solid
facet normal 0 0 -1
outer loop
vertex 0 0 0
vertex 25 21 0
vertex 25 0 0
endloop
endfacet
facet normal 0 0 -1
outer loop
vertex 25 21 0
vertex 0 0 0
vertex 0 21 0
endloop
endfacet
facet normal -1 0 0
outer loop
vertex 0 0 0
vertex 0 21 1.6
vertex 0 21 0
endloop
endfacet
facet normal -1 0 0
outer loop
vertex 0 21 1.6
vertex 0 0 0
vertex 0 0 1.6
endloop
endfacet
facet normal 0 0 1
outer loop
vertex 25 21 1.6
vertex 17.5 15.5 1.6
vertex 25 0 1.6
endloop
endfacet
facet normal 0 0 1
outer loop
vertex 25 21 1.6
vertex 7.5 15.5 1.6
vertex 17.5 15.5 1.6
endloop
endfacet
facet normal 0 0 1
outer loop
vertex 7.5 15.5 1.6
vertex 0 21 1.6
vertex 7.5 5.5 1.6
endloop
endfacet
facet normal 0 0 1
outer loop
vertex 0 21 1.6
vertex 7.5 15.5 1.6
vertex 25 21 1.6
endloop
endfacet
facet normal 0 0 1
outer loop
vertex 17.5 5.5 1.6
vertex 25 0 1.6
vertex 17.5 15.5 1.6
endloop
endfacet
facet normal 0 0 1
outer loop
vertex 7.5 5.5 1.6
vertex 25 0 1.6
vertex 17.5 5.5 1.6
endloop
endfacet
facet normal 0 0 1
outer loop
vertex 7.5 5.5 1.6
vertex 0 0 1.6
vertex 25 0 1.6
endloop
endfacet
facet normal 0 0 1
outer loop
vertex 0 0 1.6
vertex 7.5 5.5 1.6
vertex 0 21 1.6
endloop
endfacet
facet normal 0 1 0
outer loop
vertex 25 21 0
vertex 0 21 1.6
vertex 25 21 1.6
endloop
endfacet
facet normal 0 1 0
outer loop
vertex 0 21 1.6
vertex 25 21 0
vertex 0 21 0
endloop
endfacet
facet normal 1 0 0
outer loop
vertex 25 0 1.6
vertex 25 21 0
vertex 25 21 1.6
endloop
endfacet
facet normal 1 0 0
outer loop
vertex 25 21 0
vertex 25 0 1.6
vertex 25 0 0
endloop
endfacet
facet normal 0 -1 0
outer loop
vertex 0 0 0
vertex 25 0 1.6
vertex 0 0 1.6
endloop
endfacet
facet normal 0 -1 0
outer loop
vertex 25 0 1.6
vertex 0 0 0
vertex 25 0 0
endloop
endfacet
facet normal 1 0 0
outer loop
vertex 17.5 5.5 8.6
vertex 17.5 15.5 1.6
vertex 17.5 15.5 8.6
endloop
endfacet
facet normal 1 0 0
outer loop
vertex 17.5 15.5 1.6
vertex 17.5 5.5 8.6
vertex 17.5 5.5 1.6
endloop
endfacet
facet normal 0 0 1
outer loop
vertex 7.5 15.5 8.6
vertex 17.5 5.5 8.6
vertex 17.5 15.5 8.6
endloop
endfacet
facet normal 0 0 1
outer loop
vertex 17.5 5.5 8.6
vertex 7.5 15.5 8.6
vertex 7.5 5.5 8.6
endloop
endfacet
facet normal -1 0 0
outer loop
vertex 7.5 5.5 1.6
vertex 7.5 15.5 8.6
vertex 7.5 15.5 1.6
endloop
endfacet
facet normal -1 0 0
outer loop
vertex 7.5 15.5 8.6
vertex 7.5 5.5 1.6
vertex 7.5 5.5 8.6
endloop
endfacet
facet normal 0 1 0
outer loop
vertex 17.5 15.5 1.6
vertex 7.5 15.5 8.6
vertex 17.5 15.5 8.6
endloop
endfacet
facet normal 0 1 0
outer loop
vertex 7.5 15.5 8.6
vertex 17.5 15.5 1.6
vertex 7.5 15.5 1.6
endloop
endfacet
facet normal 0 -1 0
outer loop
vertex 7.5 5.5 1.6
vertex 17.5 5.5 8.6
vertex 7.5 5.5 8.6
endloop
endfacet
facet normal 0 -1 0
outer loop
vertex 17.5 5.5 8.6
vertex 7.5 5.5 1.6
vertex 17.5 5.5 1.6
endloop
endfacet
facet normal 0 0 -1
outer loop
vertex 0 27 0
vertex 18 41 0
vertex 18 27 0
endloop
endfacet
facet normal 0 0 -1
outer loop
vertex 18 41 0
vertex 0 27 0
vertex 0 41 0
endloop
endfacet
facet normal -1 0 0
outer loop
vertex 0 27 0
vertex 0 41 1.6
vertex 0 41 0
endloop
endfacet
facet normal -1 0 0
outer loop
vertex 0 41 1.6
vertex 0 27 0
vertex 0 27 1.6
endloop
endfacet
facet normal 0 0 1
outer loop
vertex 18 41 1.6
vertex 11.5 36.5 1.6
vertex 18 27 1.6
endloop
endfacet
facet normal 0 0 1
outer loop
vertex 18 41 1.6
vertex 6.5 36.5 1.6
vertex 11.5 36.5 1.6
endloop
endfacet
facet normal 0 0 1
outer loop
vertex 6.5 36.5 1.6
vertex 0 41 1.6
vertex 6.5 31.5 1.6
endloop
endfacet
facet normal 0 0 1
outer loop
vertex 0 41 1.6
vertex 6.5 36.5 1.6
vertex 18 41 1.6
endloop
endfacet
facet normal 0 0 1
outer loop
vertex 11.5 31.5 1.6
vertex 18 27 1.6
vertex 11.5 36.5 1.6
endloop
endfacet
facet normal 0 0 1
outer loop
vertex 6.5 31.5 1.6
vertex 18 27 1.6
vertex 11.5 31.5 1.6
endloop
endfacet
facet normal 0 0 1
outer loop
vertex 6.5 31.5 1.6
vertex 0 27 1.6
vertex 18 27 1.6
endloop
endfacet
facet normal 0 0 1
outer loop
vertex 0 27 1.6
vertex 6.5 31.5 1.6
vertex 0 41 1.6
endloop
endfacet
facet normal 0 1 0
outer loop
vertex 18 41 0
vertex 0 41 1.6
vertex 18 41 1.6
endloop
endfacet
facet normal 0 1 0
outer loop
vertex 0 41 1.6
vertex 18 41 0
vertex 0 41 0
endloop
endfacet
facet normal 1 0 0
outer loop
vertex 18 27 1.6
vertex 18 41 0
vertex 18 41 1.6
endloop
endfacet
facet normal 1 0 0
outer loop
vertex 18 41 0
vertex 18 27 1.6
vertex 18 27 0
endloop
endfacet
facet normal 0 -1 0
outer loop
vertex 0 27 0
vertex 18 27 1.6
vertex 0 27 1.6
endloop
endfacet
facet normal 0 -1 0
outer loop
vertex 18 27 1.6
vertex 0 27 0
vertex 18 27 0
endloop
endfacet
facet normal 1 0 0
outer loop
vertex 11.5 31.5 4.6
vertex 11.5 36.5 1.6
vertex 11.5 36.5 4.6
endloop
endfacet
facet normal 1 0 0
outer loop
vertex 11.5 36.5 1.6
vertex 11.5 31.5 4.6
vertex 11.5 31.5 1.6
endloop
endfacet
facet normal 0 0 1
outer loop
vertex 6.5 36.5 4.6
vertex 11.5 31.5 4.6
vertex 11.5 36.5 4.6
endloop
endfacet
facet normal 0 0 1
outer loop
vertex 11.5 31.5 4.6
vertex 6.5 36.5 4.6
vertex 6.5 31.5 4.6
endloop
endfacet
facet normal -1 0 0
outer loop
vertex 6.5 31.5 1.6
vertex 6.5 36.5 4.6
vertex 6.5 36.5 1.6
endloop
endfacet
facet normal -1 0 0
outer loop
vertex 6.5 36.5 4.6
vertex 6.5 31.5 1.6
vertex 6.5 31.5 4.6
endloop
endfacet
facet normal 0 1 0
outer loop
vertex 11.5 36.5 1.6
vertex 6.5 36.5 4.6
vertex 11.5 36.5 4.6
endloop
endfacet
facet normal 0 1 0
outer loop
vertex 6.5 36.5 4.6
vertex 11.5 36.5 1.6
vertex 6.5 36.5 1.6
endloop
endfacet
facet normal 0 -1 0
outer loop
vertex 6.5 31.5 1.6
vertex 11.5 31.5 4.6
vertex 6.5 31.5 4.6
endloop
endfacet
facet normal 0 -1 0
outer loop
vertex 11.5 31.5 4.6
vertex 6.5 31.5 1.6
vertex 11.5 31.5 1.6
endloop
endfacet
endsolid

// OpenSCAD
/* =============================================================================
 * 智慧香爐 — 外購元件：感測器模組（SCD41／SHT31）
 * =============================================================================
 * ★★ 這不是列印件，是外購品的示意模型 ★★
 * 尺寸來自 ../params.scad，★皆為估值★，拿到模組請實測板長寬與感測器本體高度。
 * 用途：組裝干涉檢查、螺絲可及性、目視確認裝得下。
 * ★不可當成實際尺寸寫進報告★（CLAUDE.md §7）
 *
 * 原點：PCB 左下角、z=0 為板背面（貼向前壁那一側）
 * ============================================================================= */

include <../params.scad>


// 兩個模組共用一組畫法：綠色 PCB ＋ 上面的感測器本體
module sensor_module(w, h, t, sensor_w) {
    color("#1c6b3c") linear_extrude(PCB_T) square([w, h]);
    color("#e8e4d9")
        translate([w / 2 - sensor_w / 2, h / 2 - sensor_w / 2, PCB_T])
            cube([sensor_w, sensor_w, t - PCB_T]);
}
module scd41() { sensor_module(SCD41_W, SCD41_D, SCD41_T, 10); }
module sht31() { sensor_module(SHT31_W, SHT31_D, SHT31_T, 5); }
module sensors() {
    scd41();
    translate([0, SCD41_D + 6, 0]) sht31();
}

// ── 單獨開檔時的預覽（被 use<> 引入時不執行）──
sensors();
